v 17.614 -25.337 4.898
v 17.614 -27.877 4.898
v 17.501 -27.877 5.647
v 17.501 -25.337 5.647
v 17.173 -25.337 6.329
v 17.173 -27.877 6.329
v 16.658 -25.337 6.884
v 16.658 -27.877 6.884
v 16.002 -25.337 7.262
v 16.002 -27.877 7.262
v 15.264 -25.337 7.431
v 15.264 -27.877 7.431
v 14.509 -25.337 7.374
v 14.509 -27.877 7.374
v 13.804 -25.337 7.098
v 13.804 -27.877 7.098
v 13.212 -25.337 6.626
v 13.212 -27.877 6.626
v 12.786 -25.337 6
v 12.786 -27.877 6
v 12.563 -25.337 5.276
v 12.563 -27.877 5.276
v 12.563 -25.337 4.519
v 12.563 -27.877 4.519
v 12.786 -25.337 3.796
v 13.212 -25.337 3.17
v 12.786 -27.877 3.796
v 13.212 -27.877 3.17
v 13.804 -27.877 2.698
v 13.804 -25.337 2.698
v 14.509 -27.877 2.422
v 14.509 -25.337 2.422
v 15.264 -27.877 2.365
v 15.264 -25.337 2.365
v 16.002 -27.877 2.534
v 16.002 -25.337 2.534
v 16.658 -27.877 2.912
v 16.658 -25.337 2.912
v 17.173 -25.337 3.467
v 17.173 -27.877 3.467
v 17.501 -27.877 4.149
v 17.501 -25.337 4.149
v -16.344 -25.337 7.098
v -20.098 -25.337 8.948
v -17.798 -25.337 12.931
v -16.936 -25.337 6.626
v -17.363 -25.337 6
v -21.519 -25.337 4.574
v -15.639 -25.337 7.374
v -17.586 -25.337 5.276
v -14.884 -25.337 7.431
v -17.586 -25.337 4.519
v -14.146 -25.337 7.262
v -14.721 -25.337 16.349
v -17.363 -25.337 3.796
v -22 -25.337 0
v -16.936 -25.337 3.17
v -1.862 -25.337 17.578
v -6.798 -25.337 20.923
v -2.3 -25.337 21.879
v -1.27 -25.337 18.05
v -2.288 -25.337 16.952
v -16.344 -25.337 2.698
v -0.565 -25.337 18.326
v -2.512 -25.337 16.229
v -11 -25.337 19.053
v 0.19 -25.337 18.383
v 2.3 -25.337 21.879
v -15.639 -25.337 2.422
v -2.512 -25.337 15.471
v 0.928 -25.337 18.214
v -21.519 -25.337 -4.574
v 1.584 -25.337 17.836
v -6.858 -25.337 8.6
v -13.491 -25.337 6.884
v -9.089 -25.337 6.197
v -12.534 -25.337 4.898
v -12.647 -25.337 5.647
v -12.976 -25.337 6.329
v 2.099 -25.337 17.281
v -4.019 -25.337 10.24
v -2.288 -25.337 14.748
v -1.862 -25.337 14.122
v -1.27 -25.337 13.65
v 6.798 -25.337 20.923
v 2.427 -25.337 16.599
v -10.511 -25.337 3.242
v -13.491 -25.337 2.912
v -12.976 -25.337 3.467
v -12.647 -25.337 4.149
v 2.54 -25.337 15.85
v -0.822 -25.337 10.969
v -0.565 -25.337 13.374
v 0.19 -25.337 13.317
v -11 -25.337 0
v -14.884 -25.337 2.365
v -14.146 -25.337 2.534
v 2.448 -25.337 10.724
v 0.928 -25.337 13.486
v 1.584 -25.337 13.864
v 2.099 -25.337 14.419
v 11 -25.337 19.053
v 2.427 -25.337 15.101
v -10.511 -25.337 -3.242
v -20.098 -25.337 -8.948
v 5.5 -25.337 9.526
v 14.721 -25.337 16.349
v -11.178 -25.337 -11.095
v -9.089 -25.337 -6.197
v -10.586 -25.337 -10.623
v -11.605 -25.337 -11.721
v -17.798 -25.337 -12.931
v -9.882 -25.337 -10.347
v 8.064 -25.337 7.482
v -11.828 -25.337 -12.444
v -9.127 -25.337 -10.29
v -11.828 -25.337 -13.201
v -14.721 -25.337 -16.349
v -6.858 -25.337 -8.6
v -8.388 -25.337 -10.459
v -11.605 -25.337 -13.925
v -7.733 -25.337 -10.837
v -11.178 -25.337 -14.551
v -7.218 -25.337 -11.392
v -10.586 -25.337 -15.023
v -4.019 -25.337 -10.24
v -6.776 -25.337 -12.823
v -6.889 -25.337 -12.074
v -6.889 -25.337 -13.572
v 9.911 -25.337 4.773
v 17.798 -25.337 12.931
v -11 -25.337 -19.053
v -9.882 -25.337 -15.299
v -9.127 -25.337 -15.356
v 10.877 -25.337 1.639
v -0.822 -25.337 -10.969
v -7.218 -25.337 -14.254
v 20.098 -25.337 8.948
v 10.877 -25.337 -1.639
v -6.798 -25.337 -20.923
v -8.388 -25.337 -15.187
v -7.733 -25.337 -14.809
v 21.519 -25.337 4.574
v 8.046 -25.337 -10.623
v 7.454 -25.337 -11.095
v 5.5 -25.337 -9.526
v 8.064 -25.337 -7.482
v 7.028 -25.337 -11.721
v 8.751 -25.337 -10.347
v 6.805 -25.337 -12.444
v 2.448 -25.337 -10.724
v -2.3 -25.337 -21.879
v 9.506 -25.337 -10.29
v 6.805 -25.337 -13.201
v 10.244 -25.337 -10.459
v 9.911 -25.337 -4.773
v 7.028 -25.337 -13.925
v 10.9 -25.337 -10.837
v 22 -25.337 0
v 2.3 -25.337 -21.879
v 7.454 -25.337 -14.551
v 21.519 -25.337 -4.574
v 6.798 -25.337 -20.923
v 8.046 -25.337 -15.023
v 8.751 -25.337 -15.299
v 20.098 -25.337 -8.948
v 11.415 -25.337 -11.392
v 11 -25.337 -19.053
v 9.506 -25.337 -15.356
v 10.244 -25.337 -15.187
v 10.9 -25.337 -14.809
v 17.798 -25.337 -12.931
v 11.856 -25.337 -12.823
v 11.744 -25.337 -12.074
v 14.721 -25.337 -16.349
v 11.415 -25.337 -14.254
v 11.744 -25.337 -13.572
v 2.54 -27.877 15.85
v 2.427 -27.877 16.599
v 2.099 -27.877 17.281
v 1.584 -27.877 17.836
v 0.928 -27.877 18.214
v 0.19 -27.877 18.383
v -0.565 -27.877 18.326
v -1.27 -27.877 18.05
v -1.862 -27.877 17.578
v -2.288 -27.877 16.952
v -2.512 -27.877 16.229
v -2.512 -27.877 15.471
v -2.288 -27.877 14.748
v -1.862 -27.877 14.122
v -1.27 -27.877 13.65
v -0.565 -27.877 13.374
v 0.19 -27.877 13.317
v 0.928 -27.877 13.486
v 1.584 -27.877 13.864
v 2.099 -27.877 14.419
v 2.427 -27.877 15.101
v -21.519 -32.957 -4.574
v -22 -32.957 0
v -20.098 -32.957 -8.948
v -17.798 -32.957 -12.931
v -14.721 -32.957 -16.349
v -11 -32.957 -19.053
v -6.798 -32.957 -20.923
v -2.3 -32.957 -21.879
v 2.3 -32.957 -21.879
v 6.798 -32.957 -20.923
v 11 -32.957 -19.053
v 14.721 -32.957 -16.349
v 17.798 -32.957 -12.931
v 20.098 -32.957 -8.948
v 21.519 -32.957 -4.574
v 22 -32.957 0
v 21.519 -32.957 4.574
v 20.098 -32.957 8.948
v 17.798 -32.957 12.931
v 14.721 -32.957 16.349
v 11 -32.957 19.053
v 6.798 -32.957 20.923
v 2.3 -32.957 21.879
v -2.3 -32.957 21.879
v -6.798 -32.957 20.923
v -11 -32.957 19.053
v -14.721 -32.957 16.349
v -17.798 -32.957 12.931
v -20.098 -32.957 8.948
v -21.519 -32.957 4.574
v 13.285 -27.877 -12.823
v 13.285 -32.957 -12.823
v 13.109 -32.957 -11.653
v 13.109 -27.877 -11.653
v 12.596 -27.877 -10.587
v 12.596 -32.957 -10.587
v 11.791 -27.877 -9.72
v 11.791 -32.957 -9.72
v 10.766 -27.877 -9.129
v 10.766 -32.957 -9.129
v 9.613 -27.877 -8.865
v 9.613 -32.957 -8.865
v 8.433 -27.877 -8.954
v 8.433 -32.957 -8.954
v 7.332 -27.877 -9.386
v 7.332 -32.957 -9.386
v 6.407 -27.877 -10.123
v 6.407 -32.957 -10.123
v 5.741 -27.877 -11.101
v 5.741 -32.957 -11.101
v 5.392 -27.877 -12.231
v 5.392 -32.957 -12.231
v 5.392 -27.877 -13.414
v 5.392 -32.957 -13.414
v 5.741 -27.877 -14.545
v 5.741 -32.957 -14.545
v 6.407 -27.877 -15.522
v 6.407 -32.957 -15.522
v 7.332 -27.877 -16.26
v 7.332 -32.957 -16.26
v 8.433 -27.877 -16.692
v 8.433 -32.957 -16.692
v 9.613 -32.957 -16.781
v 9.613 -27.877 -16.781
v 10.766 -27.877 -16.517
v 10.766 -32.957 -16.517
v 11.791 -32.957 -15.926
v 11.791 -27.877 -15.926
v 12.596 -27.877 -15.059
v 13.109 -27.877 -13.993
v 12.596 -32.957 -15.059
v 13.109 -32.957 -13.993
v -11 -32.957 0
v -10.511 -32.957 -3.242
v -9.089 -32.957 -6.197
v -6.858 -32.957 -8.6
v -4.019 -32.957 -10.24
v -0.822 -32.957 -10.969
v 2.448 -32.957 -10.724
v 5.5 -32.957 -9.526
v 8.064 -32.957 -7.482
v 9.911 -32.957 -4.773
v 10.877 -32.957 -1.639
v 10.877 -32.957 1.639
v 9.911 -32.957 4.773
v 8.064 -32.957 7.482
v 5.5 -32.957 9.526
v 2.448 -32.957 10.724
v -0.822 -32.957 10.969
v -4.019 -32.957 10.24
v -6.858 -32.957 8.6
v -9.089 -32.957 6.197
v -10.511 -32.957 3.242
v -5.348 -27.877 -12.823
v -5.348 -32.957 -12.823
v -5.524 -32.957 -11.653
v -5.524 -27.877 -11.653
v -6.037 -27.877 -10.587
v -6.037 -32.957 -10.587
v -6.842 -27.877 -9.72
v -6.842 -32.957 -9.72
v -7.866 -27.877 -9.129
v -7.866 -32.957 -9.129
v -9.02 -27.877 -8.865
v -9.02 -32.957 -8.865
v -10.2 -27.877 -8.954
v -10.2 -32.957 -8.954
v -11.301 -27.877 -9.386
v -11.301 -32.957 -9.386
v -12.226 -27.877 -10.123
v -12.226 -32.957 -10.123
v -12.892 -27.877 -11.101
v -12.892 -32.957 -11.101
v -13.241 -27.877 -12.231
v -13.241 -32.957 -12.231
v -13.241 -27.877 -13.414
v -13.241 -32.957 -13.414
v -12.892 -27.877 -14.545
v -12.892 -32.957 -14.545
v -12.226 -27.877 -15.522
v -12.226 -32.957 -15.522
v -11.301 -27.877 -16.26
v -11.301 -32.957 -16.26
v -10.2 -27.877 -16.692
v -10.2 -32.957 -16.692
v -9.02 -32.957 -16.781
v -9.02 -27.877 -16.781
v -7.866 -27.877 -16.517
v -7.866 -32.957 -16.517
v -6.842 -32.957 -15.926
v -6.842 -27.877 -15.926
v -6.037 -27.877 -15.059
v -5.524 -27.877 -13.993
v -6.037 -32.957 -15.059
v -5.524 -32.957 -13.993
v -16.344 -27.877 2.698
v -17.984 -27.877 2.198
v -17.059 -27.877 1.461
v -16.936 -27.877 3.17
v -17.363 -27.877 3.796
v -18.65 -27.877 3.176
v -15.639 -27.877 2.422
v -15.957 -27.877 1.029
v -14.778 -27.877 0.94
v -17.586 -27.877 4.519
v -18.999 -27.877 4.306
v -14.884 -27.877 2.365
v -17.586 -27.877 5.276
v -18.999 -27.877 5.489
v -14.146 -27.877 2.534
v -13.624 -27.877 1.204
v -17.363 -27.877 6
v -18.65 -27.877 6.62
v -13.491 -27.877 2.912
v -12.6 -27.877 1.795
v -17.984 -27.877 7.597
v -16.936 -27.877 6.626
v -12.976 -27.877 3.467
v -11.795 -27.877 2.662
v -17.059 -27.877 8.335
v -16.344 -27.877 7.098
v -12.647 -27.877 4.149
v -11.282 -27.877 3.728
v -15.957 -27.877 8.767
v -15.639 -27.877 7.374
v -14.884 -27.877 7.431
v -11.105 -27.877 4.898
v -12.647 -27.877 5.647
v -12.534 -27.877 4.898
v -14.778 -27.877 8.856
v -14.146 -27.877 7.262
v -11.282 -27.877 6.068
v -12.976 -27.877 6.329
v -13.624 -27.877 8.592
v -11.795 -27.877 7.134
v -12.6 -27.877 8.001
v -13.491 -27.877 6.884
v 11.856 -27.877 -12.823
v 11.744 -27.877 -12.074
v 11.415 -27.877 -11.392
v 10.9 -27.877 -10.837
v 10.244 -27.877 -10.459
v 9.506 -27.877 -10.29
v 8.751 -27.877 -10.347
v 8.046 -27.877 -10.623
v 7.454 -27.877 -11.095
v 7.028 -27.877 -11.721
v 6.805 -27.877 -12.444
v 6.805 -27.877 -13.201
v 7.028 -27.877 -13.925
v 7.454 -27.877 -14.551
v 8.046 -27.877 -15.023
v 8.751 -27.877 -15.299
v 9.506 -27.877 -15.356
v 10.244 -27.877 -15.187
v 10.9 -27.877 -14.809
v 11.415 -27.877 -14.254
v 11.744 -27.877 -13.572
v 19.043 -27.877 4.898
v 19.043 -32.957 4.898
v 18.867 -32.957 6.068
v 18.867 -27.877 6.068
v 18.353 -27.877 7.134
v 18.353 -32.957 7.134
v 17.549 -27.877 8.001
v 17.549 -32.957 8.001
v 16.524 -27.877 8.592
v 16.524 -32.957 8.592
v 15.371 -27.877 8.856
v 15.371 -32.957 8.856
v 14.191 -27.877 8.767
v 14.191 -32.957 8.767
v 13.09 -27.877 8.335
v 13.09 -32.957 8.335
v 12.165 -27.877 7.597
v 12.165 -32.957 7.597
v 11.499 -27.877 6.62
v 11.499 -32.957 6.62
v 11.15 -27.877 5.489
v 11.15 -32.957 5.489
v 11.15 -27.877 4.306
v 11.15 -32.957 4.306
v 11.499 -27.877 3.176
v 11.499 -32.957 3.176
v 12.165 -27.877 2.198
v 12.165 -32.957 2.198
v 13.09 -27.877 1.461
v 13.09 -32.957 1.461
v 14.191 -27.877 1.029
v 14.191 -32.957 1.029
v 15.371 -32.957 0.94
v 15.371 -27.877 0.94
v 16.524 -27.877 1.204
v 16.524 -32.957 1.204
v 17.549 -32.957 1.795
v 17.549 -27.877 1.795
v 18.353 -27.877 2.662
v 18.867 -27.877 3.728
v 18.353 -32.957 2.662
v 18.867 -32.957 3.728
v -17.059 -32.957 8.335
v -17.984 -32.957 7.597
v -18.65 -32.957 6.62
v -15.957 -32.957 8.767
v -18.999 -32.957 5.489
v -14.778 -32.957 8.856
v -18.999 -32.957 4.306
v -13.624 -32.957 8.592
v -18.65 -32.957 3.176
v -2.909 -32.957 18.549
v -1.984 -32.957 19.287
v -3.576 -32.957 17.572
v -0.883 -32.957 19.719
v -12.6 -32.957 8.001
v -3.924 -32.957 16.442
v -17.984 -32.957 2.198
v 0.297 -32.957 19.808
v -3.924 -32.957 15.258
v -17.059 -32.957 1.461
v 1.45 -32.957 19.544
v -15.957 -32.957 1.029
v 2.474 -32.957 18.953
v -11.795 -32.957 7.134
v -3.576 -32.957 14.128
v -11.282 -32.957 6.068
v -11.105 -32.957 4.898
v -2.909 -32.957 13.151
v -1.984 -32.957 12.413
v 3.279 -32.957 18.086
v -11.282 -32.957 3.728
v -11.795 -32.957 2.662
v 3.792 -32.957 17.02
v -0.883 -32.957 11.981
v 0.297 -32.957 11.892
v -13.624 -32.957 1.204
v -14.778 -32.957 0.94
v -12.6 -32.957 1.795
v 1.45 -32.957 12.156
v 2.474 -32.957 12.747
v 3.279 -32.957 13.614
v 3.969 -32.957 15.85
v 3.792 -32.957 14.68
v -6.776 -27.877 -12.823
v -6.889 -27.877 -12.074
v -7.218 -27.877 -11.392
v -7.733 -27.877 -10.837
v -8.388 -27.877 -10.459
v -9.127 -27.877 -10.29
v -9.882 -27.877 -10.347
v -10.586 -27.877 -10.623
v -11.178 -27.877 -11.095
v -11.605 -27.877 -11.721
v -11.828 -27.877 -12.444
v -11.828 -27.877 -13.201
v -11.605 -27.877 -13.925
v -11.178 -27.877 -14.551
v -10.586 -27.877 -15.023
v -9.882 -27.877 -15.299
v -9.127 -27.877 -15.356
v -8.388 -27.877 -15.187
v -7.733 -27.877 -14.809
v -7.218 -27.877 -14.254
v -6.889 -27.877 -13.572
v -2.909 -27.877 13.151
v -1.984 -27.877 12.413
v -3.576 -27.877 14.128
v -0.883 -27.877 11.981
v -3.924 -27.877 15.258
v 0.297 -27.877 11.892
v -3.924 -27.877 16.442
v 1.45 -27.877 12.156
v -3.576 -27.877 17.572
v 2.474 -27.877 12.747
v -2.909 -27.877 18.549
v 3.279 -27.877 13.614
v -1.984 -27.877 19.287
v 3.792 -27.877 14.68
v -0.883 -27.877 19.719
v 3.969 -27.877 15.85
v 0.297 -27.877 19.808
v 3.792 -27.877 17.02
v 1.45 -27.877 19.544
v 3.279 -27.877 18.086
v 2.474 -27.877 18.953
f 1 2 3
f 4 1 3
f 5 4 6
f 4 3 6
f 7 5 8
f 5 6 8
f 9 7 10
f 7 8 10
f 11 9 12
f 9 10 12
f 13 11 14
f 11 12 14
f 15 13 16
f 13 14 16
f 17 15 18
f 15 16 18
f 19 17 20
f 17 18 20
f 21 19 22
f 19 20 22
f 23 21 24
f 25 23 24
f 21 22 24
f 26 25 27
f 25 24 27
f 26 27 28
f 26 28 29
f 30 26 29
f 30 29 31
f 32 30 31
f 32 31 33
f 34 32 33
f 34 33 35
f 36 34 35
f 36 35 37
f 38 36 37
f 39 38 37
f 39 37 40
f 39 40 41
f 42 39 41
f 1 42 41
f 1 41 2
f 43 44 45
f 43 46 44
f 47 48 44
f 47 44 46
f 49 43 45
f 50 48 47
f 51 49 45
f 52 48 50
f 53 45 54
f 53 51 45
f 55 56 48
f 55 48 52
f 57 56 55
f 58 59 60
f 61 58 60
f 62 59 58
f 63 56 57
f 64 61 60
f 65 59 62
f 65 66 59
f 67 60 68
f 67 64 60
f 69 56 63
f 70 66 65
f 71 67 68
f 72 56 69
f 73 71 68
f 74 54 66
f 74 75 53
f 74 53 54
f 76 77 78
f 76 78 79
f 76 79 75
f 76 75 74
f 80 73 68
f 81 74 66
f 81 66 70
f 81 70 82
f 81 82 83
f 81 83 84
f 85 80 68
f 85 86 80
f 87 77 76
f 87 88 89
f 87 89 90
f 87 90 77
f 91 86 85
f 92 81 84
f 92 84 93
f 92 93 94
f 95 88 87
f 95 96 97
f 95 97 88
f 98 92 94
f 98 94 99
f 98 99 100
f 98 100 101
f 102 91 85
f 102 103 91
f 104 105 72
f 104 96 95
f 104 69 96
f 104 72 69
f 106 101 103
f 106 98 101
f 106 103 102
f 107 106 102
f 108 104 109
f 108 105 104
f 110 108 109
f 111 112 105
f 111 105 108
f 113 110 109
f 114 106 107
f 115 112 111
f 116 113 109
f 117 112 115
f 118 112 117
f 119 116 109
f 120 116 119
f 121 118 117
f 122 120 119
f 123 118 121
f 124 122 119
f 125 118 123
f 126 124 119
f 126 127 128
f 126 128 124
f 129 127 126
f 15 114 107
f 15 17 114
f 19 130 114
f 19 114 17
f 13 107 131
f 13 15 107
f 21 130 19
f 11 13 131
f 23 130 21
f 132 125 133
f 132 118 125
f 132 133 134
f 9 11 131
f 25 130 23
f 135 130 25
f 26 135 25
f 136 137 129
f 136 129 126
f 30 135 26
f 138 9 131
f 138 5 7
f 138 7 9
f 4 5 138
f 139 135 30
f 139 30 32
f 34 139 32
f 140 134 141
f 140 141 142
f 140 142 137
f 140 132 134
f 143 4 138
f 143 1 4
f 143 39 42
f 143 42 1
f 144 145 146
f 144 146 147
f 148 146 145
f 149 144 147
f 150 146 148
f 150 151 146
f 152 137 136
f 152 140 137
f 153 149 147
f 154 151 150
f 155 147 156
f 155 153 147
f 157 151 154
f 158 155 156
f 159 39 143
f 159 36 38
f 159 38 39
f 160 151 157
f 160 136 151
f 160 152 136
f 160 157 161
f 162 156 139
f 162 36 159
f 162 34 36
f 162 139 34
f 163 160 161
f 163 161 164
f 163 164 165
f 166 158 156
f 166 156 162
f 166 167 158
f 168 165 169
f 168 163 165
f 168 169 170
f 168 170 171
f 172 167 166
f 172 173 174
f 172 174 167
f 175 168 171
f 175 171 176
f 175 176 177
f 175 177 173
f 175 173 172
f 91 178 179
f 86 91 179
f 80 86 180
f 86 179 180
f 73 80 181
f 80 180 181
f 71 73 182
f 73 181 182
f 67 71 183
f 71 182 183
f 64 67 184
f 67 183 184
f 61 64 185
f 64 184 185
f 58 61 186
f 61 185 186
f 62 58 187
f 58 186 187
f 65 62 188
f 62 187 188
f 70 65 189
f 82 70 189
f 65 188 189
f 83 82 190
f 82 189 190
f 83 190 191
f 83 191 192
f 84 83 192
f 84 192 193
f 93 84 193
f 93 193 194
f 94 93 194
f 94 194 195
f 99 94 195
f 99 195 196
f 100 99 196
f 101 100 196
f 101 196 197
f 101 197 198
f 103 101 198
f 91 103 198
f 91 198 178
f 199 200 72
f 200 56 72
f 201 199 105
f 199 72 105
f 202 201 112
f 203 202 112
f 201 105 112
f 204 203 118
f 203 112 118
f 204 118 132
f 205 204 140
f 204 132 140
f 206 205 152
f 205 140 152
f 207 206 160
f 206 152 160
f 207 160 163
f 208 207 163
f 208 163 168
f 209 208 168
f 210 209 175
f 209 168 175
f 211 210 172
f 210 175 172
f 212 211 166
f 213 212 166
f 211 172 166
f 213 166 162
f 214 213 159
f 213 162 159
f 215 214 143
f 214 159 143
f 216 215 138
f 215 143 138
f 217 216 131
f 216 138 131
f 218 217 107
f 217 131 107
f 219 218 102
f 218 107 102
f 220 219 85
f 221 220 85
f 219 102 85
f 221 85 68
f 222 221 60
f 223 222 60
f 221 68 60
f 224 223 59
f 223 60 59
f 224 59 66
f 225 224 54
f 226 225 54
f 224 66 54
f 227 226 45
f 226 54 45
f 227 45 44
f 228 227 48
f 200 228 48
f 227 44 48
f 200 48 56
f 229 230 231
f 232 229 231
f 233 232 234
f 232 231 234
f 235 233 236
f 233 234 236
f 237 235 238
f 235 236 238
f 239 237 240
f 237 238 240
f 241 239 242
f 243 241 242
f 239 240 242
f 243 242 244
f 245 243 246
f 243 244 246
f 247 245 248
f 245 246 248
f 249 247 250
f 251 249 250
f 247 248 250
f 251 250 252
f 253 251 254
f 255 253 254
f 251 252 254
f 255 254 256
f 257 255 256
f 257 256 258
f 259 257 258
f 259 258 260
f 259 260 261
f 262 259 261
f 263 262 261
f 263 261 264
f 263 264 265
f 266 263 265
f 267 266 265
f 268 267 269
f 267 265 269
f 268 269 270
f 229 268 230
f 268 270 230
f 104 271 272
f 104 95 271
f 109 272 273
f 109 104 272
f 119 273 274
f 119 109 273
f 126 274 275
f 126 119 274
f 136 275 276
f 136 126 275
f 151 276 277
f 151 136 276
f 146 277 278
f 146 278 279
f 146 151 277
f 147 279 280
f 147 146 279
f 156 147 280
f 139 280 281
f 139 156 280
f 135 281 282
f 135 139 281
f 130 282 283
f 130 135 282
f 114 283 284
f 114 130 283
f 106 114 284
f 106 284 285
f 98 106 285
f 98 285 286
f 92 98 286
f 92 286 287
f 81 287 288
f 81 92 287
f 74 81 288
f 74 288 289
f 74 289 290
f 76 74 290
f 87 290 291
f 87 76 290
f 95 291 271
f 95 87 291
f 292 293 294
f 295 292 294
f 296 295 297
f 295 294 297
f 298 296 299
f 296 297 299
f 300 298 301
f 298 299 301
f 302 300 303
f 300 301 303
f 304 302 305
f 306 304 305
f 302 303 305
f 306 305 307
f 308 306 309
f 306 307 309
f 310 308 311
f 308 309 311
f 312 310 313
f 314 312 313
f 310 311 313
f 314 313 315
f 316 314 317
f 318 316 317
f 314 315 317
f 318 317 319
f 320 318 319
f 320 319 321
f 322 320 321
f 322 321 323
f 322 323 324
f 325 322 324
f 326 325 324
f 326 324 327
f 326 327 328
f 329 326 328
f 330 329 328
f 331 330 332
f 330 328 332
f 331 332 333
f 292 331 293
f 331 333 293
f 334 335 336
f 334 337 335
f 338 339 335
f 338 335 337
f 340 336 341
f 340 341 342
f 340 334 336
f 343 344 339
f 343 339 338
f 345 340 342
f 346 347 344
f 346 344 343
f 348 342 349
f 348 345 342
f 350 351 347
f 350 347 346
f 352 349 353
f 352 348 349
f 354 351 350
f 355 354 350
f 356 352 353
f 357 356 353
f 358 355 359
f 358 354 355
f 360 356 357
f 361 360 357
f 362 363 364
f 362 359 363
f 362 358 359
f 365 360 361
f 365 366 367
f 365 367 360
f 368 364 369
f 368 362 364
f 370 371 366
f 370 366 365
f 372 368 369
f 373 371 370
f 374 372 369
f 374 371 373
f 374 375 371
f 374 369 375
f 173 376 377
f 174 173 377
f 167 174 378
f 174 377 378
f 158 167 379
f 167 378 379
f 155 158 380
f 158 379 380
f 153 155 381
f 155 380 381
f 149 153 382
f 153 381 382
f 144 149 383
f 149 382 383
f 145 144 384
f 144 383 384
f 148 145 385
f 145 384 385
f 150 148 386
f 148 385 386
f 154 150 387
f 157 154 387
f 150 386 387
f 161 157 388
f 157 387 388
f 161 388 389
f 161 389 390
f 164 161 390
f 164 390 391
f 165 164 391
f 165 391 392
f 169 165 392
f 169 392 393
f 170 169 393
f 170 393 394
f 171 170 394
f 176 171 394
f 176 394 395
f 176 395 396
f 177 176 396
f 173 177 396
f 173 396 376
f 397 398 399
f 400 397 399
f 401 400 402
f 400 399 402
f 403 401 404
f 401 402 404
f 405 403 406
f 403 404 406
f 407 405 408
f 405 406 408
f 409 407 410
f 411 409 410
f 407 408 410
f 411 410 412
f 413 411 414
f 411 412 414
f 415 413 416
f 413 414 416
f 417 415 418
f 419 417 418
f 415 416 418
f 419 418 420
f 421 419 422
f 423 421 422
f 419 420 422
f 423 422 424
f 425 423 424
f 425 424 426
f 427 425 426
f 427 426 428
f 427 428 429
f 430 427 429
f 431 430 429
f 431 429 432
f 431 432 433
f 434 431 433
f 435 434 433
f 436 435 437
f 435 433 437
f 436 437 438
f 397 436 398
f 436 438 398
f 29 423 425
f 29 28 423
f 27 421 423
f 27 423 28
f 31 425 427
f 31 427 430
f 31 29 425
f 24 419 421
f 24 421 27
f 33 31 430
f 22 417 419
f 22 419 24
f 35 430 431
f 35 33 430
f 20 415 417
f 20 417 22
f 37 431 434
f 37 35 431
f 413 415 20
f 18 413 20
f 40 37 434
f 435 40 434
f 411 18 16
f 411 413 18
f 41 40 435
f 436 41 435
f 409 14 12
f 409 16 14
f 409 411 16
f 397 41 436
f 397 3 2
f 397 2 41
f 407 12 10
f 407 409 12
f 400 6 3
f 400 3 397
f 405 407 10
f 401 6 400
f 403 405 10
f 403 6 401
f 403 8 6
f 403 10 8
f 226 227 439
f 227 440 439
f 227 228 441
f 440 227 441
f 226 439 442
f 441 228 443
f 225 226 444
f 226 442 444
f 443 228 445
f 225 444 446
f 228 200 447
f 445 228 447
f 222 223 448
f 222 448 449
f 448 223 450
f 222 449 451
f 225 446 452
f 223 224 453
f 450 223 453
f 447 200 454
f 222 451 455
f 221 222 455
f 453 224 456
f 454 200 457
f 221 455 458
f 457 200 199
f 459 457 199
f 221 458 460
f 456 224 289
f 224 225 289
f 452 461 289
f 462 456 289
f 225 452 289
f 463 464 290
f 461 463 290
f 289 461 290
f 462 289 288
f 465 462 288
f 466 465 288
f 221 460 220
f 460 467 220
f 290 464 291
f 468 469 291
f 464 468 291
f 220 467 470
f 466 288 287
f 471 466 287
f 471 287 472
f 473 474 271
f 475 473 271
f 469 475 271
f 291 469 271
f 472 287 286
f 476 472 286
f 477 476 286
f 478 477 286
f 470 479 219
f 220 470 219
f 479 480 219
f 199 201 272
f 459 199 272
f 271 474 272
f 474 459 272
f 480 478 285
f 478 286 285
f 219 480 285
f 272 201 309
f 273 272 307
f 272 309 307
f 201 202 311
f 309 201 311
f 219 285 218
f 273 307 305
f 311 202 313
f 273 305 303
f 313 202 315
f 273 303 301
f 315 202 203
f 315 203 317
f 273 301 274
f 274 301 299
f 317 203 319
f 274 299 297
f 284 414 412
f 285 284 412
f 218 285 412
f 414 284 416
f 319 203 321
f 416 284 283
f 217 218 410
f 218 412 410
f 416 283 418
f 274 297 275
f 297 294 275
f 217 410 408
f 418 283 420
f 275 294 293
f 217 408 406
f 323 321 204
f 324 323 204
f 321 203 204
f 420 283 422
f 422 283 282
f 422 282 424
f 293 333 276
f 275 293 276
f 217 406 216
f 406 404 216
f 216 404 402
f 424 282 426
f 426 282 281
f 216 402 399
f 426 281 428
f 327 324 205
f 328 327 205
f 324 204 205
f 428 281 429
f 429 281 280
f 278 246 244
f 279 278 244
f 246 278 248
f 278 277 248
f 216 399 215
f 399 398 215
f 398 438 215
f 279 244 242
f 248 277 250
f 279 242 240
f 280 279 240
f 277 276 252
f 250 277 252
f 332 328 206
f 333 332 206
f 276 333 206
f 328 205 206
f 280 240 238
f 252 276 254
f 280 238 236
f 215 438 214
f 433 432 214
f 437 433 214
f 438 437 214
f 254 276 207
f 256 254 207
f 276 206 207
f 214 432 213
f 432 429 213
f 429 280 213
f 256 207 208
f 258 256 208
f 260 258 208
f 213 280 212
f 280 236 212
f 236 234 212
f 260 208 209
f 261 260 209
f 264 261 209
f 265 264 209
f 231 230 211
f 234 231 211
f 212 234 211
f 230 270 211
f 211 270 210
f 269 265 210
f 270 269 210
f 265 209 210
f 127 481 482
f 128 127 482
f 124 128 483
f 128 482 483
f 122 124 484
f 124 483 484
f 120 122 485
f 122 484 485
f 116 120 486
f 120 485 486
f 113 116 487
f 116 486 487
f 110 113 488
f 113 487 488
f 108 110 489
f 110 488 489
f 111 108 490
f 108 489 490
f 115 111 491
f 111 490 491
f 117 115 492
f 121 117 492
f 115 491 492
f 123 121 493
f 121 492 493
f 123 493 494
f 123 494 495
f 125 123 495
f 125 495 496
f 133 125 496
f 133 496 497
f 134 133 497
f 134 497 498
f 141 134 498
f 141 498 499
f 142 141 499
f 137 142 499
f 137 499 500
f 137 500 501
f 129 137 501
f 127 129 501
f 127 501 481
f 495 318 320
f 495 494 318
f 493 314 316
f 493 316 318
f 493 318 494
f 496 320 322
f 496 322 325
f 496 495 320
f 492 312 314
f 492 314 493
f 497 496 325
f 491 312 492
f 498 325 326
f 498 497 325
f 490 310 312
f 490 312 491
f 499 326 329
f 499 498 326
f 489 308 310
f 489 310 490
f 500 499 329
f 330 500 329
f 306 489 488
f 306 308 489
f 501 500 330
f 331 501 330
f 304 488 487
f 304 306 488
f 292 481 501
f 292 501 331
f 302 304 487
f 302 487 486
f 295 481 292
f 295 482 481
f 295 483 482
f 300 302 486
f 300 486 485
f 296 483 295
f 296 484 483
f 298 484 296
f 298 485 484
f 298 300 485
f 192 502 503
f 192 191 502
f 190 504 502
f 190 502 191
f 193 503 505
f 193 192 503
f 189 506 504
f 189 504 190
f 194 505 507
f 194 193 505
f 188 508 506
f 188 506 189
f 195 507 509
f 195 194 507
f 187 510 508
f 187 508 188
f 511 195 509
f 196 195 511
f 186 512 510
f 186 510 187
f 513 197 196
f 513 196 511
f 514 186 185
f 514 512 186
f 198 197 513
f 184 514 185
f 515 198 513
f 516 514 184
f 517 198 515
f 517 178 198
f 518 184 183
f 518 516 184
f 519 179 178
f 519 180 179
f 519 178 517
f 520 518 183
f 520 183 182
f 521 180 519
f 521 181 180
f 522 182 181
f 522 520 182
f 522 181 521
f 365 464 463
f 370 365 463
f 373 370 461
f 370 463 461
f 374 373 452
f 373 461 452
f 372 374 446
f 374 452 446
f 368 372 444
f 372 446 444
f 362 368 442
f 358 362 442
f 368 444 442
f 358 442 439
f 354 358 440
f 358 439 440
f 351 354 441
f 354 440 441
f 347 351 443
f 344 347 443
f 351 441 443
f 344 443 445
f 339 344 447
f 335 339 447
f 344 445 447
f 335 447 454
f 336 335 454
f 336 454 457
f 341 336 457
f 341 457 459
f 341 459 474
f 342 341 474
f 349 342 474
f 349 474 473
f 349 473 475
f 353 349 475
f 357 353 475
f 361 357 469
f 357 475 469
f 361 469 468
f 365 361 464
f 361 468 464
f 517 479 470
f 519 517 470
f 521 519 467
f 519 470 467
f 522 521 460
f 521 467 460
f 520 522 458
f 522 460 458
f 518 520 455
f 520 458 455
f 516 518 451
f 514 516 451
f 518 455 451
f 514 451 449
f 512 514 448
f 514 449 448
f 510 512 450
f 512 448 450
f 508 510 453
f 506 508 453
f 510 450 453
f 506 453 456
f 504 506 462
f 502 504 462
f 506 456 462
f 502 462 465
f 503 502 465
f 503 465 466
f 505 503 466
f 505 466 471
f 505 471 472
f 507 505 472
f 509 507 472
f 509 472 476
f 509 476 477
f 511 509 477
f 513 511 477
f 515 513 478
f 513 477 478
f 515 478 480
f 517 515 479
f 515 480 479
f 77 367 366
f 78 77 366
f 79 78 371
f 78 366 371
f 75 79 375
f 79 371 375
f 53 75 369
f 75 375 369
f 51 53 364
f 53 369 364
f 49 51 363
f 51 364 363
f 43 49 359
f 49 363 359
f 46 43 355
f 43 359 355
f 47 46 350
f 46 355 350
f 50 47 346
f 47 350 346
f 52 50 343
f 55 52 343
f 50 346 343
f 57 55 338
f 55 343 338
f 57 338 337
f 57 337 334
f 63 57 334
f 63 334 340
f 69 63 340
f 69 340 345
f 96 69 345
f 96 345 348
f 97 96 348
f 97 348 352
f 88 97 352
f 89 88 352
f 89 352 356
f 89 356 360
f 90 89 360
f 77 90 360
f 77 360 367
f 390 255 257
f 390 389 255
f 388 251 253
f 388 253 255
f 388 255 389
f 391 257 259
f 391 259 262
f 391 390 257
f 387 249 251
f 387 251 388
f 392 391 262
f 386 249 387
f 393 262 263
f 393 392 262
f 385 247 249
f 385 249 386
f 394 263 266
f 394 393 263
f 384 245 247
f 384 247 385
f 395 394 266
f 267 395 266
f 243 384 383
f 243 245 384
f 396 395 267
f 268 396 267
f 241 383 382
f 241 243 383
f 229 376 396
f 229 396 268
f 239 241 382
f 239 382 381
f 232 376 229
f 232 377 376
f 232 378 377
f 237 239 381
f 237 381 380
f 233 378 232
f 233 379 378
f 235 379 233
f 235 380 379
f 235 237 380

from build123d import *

# Parameters (mm, degrees)
SKETCH1_W          = 11
SKETCH1_H          = 7.62
SKETCH2_R          = 2.54
CUT_EXTRUDE1_DEPTH = 33.032240009
SKETCH3_R          = 3.96875
CUT_EXTRUDE2_DEPTH = 5.08


with BuildPart() as part:
    # Sketch1 → Revolve1 (revolve)
    with BuildSketch(Plane.XY, mode=Mode.PRIVATE) as revolve1_sk:
        with Locations((16.5, -29.147212191)):
            Rectangle(SKETCH1_W, SKETCH1_H)
    revolve(revolve1_sk.sketch.rotate(Axis((0, 18.662787809, 0), (0, -1, 0)), 180), axis=Axis((0, 18.662787809, 0), (0, -1, 0)))

    # Sketch2 → Cut-Extrude1 (cut, through all)
    with BuildSketch(Plane.XZ.offset(32.957212191)):
        with Locations((15.074245783, 4.897919361)):
            Circle(SKETCH2_R)
        with Locations((0, 15.85)):
            Circle(SKETCH2_R)
        with Locations((9.316396249, -12.822919361)):
            Circle(SKETCH2_R)
        with Locations((-9.316396249, -12.822919361)):
            Circle(SKETCH2_R)
        with Locations((-15.074245783, 4.897919361)):
            Circle(SKETCH2_R)
    extrude(amount=-CUT_EXTRUDE1_DEPTH, mode=Mode.SUBTRACT)

    # Sketch3 → Cut-Extrude2 (cut)
    with BuildSketch(Plane(origin=(0, -32.957212191, 0), x_dir=(-1, 0, 0), z_dir=(0, -1, 0))):
        with Locations(Location((0, -15.85, 0), (0, 0, 180))):
            Circle(SKETCH3_R)
        with Locations(Location((-15.074245783, -4.897919361, 0), (0, 0, 180))):
            Circle(SKETCH3_R)
        with Locations(Location((-9.316396249, 12.822919361, 0), (0, 0, 180))):
            Circle(SKETCH3_R)
        with Locations(Location((9.316396249, 12.822919361, 0), (0, 0, 180))):
            Circle(SKETCH3_R)
        with Locations(Location((15.074245783, -4.897919361, 0), (0, 0, 180))):
            Circle(SKETCH3_R)
    extrude(amount=-CUT_EXTRUDE2_DEPTH, mode=Mode.SUBTRACT)


solid = part.part
